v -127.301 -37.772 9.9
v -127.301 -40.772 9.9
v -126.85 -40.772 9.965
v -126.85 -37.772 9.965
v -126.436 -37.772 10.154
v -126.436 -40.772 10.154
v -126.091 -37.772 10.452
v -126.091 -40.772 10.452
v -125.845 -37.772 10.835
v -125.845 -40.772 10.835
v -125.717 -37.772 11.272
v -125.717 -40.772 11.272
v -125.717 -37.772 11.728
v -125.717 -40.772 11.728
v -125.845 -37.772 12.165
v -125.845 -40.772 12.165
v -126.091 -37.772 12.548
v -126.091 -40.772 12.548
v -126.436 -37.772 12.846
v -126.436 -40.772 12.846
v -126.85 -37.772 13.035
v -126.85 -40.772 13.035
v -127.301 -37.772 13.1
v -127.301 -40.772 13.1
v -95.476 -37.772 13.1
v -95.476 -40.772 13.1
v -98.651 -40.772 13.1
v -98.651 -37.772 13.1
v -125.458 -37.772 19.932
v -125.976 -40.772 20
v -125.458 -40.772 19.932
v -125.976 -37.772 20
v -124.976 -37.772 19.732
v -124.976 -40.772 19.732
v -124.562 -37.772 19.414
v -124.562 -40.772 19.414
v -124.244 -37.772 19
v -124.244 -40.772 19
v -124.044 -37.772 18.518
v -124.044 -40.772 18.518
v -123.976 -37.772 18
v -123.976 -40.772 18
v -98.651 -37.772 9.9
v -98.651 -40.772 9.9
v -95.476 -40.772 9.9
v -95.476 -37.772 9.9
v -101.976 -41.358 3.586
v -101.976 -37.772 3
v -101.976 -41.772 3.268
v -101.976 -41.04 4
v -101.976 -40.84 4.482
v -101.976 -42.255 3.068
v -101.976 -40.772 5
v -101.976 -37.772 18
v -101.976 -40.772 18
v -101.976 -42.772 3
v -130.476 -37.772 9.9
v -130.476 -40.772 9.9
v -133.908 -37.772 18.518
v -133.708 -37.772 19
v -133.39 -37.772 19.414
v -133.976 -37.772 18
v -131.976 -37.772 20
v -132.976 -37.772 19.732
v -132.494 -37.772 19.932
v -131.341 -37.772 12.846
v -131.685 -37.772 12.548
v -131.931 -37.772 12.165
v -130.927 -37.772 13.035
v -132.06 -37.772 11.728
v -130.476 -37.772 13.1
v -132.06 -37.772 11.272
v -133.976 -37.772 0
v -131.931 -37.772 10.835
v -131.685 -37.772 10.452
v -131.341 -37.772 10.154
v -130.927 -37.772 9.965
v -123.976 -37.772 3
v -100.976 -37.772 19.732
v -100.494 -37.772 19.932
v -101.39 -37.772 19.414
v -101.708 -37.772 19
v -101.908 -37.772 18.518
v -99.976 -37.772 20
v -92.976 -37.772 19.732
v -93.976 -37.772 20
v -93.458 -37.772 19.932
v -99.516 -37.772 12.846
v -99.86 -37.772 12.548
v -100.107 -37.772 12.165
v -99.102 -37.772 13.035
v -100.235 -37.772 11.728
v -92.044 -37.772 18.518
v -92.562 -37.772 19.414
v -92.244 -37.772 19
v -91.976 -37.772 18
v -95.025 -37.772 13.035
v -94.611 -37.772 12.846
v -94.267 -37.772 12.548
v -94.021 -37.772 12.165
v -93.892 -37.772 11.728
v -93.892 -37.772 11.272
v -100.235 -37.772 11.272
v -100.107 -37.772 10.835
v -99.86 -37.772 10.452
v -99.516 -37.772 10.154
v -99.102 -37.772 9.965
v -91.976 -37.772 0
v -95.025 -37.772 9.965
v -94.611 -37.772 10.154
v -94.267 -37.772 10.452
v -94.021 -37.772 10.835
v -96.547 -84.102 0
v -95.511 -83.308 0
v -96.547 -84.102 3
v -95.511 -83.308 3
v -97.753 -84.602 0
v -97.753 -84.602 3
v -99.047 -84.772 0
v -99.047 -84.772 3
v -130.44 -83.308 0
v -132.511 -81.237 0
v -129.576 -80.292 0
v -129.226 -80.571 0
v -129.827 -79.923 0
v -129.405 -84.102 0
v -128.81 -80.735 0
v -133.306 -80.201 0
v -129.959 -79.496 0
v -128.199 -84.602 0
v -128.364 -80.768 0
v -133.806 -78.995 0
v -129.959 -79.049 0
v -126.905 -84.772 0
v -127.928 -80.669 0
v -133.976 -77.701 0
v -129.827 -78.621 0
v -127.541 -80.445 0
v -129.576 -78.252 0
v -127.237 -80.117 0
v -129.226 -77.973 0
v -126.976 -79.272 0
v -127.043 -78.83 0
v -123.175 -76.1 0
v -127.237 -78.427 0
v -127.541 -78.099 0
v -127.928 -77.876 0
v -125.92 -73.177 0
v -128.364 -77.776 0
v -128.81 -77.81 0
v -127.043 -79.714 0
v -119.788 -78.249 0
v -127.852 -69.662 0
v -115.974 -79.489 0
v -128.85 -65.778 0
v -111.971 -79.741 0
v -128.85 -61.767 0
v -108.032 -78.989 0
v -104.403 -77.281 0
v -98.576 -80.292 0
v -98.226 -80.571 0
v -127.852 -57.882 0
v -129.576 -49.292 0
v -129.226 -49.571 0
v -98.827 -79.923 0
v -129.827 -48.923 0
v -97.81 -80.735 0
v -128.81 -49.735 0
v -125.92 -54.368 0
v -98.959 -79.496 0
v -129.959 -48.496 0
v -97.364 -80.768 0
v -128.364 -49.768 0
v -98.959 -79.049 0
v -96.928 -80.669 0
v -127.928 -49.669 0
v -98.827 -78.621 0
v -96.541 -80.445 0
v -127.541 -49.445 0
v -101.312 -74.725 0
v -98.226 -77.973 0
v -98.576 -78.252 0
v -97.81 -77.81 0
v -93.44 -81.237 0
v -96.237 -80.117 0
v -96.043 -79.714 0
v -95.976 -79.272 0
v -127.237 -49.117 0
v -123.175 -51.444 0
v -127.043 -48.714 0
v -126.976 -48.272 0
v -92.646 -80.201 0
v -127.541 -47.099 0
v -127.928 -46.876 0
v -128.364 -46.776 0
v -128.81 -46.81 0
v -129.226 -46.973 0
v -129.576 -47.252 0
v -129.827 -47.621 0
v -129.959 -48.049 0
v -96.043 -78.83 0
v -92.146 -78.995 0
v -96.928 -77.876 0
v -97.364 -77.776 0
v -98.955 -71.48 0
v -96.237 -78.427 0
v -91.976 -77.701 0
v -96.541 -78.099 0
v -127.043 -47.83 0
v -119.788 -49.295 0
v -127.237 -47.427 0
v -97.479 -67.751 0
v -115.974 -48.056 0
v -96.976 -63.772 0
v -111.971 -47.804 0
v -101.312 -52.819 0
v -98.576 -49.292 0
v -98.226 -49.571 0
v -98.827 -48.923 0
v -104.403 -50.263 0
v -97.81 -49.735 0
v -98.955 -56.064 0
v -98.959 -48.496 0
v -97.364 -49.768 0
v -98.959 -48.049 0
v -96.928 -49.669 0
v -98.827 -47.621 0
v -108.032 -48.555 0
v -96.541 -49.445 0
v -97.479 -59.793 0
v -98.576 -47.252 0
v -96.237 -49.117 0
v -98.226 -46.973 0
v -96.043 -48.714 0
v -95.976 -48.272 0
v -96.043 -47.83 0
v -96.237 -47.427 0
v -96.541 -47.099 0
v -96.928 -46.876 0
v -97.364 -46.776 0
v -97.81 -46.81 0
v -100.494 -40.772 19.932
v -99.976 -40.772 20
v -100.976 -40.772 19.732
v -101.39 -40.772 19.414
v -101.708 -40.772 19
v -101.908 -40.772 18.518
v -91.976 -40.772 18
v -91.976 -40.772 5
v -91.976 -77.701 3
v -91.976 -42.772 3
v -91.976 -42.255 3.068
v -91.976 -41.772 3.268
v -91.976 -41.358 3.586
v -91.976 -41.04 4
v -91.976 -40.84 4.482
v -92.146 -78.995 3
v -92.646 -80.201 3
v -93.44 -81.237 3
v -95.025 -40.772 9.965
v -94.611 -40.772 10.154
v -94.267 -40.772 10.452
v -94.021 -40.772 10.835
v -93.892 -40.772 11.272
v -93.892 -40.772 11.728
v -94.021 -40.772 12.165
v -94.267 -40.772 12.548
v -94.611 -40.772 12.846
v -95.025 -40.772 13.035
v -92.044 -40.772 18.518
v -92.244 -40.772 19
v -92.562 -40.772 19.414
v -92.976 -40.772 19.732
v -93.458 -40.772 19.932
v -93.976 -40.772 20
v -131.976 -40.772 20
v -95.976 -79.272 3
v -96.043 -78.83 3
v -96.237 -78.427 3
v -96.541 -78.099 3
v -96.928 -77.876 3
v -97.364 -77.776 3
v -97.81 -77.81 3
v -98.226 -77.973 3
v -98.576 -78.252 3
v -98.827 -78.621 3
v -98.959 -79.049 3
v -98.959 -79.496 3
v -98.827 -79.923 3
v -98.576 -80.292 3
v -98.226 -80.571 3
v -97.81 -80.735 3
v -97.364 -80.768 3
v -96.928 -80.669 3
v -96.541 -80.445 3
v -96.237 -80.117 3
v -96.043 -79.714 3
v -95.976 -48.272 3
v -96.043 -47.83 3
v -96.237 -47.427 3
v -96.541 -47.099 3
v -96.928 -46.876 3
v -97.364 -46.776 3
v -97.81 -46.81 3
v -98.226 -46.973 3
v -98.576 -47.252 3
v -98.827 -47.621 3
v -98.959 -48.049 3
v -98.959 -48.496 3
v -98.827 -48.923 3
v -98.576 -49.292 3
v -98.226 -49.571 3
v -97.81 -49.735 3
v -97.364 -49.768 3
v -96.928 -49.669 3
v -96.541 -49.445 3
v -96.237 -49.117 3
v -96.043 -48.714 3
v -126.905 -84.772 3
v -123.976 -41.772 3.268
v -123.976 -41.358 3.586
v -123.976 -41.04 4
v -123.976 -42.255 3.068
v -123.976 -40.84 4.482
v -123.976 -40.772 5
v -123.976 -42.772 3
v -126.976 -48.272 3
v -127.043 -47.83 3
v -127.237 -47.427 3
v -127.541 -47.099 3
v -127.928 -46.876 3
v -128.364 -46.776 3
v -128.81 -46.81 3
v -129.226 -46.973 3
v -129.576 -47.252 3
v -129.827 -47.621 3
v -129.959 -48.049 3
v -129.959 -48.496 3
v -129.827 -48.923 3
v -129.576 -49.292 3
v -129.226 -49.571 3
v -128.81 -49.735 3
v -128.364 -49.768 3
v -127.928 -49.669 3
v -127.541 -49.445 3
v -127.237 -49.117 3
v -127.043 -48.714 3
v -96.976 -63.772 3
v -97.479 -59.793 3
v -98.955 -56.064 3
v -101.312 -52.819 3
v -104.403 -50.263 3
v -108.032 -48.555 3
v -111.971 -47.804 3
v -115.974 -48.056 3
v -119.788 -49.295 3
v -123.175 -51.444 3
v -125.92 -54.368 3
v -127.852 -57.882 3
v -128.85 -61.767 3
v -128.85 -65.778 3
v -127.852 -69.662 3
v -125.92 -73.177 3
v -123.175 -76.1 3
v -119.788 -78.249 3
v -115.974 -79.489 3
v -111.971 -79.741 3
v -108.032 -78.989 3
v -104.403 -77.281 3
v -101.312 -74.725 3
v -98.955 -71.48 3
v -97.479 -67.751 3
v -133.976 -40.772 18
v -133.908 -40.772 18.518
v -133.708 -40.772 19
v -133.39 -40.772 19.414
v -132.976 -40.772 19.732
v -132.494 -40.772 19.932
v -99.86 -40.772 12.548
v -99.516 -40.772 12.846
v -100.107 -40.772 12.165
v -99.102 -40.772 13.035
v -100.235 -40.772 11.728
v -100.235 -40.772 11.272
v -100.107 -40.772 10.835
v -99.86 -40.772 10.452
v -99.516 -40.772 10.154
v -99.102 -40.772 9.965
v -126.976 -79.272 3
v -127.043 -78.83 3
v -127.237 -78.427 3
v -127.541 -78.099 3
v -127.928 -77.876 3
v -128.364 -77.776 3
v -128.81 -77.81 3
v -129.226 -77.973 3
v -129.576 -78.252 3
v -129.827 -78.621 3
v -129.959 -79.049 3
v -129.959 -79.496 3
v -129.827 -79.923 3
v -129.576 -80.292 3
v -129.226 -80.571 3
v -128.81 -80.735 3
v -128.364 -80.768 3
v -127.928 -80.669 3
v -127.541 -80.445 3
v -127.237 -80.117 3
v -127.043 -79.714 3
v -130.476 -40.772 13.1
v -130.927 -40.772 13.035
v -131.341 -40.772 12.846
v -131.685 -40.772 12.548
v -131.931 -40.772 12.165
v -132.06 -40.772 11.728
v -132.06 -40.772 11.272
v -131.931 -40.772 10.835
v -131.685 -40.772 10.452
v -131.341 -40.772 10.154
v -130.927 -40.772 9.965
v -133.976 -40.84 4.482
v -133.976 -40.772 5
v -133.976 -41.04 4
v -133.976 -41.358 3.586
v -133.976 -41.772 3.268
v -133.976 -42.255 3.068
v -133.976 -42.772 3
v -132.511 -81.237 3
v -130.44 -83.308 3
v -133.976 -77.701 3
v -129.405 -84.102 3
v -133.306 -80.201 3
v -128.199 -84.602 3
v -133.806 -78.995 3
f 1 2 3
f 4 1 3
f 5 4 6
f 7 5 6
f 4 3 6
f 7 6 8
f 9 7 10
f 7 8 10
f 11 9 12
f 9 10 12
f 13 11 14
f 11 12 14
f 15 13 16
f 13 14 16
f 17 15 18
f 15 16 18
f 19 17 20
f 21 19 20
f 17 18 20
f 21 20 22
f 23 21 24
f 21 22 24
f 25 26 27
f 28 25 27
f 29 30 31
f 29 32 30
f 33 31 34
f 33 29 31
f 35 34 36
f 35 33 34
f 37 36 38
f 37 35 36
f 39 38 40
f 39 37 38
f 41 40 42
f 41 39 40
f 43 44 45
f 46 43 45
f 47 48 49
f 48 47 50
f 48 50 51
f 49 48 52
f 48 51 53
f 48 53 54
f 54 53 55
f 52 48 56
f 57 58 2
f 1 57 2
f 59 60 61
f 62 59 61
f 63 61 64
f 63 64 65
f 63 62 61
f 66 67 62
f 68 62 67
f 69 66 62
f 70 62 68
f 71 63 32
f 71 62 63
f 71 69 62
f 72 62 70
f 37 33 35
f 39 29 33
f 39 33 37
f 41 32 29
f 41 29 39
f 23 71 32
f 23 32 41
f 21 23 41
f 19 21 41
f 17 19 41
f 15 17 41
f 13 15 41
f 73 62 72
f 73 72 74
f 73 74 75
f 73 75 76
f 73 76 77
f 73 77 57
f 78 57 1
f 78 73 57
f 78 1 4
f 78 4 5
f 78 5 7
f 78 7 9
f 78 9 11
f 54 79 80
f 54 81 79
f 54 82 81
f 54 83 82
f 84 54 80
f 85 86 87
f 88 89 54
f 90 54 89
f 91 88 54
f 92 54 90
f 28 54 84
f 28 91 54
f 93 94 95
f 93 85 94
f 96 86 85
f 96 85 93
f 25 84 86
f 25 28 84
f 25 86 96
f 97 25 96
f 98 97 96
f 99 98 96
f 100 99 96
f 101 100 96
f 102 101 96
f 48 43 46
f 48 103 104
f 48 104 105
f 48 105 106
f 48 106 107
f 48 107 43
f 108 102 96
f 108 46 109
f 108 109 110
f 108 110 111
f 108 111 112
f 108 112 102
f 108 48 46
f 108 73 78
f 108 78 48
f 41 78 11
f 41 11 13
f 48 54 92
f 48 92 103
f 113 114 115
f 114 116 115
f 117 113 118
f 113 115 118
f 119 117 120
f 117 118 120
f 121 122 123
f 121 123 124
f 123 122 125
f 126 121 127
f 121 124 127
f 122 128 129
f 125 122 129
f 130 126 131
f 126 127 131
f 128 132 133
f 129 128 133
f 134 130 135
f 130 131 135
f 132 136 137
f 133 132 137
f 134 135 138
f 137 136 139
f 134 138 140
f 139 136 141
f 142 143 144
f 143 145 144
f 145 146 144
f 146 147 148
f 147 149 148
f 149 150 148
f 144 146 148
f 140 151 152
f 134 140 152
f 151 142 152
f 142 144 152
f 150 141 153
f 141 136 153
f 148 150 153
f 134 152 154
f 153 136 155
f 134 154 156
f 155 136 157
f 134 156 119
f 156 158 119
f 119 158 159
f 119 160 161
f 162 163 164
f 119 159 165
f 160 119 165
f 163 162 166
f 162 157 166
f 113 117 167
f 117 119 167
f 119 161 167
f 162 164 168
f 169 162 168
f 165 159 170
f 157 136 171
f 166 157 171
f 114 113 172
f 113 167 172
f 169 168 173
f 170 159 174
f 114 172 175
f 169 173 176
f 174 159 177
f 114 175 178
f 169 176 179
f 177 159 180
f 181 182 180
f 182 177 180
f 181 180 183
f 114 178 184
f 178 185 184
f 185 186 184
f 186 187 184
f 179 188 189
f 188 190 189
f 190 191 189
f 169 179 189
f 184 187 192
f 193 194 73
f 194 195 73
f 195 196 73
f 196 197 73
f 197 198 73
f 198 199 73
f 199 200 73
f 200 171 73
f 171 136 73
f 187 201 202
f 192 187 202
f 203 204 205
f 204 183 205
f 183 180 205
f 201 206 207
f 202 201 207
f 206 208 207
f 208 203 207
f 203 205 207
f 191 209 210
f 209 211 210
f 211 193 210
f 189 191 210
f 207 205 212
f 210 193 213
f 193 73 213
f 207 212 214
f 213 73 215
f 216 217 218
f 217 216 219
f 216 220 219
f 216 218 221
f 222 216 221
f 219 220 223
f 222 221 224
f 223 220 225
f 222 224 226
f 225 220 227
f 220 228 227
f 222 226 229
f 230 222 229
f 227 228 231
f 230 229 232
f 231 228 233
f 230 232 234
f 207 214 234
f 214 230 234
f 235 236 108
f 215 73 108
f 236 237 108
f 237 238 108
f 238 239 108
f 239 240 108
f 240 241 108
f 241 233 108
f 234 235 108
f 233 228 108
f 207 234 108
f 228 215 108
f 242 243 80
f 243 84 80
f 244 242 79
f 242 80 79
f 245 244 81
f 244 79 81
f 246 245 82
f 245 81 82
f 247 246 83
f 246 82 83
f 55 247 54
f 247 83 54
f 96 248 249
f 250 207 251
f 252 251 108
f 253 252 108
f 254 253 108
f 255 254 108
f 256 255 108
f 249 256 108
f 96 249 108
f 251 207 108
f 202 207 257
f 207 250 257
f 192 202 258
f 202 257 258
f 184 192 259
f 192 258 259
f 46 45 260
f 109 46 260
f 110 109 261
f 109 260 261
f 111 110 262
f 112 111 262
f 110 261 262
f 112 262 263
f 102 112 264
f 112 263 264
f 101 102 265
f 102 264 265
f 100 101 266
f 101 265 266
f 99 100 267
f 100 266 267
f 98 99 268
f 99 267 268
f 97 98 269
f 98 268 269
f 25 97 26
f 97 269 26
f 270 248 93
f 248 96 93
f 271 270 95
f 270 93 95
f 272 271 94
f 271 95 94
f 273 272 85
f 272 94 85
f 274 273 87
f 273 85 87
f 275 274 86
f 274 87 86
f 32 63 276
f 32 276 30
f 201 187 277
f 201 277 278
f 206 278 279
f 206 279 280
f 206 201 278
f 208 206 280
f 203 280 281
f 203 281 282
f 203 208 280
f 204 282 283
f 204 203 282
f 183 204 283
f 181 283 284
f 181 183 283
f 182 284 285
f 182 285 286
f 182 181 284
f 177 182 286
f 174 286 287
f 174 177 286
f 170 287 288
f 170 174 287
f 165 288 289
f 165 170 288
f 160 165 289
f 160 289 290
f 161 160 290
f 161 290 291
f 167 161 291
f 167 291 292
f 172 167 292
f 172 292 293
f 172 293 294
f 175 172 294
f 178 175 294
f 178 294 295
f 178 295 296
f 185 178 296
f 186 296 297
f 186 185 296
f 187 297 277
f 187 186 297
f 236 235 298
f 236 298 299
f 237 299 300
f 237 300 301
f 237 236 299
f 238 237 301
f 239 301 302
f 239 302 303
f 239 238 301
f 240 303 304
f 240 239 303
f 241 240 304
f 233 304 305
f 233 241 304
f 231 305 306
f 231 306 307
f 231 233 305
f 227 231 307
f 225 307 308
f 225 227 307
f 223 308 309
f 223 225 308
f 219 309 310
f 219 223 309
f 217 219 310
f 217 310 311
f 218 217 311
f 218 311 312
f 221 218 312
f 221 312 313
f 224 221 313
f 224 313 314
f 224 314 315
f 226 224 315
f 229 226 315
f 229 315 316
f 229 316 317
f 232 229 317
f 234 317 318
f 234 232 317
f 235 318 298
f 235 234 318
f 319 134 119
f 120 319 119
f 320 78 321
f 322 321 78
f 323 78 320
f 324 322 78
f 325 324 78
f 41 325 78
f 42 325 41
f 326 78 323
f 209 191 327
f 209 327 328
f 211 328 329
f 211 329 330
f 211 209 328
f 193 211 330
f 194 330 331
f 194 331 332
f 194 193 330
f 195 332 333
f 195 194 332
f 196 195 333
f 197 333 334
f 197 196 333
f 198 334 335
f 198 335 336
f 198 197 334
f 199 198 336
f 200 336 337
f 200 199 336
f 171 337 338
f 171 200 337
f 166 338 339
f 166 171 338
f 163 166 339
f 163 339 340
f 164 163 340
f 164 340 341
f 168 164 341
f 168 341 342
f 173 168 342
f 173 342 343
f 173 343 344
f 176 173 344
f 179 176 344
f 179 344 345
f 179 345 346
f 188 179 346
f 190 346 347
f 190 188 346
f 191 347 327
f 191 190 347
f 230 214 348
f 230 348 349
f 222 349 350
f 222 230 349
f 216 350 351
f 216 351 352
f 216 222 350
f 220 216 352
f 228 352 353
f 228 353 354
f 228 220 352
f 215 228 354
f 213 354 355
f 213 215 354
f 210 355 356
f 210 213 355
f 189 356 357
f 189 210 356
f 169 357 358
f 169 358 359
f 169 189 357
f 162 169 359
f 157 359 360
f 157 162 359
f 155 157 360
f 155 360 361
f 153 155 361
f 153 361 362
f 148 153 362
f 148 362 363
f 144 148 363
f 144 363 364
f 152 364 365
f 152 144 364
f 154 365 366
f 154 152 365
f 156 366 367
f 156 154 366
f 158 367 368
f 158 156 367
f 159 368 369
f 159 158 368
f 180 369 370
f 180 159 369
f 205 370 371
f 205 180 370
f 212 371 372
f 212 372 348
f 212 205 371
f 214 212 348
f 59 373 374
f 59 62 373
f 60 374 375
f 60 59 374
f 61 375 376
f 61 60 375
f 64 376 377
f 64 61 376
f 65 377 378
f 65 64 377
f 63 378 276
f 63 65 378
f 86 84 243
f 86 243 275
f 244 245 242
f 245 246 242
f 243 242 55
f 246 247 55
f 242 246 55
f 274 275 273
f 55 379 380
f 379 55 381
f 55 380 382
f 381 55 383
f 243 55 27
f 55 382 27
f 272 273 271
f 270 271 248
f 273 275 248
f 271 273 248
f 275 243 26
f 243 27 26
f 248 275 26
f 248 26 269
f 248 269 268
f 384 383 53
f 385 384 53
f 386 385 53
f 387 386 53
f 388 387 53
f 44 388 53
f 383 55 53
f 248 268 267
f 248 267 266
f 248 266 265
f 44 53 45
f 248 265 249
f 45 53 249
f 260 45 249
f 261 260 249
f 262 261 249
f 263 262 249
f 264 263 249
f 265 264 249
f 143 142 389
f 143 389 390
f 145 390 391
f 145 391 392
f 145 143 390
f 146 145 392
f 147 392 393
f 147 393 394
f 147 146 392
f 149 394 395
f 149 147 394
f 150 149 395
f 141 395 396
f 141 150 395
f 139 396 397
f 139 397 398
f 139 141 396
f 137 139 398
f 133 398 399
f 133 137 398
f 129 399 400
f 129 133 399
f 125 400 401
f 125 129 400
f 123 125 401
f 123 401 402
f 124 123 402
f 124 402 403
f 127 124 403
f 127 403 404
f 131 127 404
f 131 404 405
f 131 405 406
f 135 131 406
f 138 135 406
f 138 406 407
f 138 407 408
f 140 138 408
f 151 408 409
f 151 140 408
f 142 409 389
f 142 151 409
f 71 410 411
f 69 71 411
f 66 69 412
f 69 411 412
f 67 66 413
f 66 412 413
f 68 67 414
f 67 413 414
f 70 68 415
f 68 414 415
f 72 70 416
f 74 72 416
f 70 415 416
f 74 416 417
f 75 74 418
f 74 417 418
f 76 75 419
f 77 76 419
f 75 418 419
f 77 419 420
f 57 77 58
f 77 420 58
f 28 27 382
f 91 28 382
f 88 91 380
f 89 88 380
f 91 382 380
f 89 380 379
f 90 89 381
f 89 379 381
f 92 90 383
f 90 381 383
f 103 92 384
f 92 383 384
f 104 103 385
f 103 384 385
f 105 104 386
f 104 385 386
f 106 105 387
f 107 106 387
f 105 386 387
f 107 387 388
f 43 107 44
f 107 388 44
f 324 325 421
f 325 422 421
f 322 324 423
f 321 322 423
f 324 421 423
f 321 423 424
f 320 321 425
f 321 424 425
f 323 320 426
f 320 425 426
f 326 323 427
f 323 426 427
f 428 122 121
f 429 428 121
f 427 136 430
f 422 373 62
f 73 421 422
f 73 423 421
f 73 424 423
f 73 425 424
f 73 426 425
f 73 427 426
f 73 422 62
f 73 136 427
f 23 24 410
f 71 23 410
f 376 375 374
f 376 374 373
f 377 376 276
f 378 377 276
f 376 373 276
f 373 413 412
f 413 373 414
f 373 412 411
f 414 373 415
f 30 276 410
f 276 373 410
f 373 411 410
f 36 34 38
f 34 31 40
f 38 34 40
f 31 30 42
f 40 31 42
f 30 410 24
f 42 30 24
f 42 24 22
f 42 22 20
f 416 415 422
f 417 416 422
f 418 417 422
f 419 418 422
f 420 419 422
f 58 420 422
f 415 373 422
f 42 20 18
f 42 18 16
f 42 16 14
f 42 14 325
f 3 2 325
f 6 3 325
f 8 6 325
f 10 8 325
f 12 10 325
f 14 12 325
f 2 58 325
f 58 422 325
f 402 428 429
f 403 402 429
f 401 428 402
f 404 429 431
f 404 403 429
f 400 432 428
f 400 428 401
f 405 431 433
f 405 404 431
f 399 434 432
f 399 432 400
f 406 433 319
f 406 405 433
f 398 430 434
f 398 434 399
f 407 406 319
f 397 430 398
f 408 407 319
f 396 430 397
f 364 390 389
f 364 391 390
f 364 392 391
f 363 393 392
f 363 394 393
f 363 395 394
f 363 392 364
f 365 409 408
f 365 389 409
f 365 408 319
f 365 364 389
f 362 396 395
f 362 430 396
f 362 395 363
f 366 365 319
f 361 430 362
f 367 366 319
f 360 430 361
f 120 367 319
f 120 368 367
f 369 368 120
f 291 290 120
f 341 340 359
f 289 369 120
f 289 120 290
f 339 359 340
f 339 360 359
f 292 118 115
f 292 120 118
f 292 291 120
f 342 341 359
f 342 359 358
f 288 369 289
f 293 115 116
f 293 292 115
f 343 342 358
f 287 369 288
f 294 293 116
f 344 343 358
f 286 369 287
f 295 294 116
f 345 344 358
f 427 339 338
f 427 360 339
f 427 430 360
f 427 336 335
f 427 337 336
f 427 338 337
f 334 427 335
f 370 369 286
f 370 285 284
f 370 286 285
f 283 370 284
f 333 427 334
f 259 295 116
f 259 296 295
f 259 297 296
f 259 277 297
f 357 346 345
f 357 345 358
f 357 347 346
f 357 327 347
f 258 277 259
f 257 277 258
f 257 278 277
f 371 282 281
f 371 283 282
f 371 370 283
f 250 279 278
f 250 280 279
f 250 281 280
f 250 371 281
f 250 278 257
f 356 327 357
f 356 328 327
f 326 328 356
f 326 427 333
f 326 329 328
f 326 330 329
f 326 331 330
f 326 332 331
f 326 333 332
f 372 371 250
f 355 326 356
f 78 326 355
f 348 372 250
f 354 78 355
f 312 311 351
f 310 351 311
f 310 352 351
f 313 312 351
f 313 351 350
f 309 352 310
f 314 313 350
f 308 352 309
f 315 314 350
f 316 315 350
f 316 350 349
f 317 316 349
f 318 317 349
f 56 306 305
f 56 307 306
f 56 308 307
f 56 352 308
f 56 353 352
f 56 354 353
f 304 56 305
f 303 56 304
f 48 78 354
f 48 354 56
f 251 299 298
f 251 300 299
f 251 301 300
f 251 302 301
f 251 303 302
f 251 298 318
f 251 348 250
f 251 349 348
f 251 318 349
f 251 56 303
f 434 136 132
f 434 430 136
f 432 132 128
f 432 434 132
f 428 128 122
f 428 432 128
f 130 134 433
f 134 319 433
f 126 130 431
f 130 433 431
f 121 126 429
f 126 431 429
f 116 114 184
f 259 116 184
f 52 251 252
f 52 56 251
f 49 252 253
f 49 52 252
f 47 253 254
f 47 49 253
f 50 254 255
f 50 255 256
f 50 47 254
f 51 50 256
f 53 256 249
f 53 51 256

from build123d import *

# Parameters (mm, degrees)
F0_R     = 1.5
F0_R_2   = 16
F1_DEPTH = 3
F0_W     = 42
F0_H     = 3
F2_DEPTH = 20
F4_DEPTH = 25
F3_W     = 22
F3_H     = 17
F5_DEPTH = 25
F6_R     = 2
F7_R     = 5


with BuildPart() as f1:
    # F0 (on Top) → F1 (new body)
    with BuildSketch(Plane.XY):
        Polygon((-96.9759252071, -84.7722164392), (-91.9759252071, -79.7722164392), (-91.9759252071, -47.7722164392), (-91.9759252071, -42.7722164392), (-91.9759252071, -40.7722164392), (-133.9759252071, -40.7722164392), (-133.9759252071, -42.7722164392), (-133.9759252071, -47.7722164392), (-133.9759252071, -79.7722164392), (-128.9759252071, -84.7722164392), align=None)
        with Locations((-128.4759252071, -79.2722164392)):
            Circle(F0_R, mode=Mode.SUBTRACT)
        with Locations((-97.4759252071, -79.2722164392)):
            Circle(F0_R, mode=Mode.SUBTRACT)
        with Locations((-112.9759252071, -63.7722164392)):
            Circle(F0_R_2, mode=Mode.SUBTRACT)
        with Locations((-128.4759252071, -48.2722164392)):
            Circle(F0_R, mode=Mode.SUBTRACT)
        with Locations((-97.4759252071, -48.2722164392)):
            Circle(F0_R, mode=Mode.SUBTRACT)
    extrude(amount=F1_DEPTH)

    # F0 (on Top) → F2 (join)
    with BuildSketch(Plane.XY):
        with Locations((-112.9759252071, -39.2722164392)):
            Rectangle(F0_W, F0_H)
    extrude(amount=F2_DEPTH)

    # F3 (on face) → F4 (cut)
    with BuildSketch(Plane.XZ.offset(40.7722164392)):
        with BuildLine():
            ThreePointArc((-95.4759252071, 9.9), (-93.8759252071, 11.5), (-95.4759252071, 13.1))
            Line((-95.4759252071, 13.1), (-98.6511558294, 13.1))
            ThreePointArc((-98.6511558294, 13.1), (-100.2511558294, 11.5), (-98.6511558294, 9.9))
            Line((-98.6511558294, 9.9), (-95.4759252071, 9.9))
        make_face()
        with BuildLine():
            Line((-127.3006945848, 13.1), (-130.4759252071, 13.1))
            ThreePointArc((-130.4759252071, 13.1), (-132.0759252071, 11.5), (-130.4759252071, 9.9))
            Line((-130.4759252071, 9.9), (-127.3006945848, 9.9))
            ThreePointArc((-127.3006945848, 9.9), (-125.7006945848, 11.5), (-127.3006945848, 13.1))
        make_face()
    extrude(amount=-F4_DEPTH, mode=Mode.SUBTRACT)

    # F3 (on face) → F5 (cut)
    with BuildSketch(Plane.XZ.offset(40.7722164392)):
        with Locations((-112.9759252071, 11.5)):
            Rectangle(F3_W, F3_H)
    extrude(amount=-F5_DEPTH, mode=Mode.SUBTRACT)

    # F6
    f6_edges = [f1.edges().sort_by_distance(p)[0] for p in [
        (-96.975925, -40.772216, 3),
        (-128.975925, -40.772216, 3),
        (-91.975925, -39.272216, 20),
        (-101.975925, -39.272216, 20),
        (-123.975925, -39.272216, 20),
        (-133.975925, -39.272216, 20),
    ]]
    fillet(f6_edges, radius=F6_R)

    # F7
    f7_edges = [f1.edges().sort_by_distance(p)[0] for p in [
        (-133.975925, -79.772216, 1.5),
        (-128.975925, -84.772216, 1.5),
        (-96.975925, -84.772216, 1.5),
        (-91.975925, -79.772216, 1.5),
    ]]
    fillet(f7_edges, radius=F7_R)


solid = f1.part
